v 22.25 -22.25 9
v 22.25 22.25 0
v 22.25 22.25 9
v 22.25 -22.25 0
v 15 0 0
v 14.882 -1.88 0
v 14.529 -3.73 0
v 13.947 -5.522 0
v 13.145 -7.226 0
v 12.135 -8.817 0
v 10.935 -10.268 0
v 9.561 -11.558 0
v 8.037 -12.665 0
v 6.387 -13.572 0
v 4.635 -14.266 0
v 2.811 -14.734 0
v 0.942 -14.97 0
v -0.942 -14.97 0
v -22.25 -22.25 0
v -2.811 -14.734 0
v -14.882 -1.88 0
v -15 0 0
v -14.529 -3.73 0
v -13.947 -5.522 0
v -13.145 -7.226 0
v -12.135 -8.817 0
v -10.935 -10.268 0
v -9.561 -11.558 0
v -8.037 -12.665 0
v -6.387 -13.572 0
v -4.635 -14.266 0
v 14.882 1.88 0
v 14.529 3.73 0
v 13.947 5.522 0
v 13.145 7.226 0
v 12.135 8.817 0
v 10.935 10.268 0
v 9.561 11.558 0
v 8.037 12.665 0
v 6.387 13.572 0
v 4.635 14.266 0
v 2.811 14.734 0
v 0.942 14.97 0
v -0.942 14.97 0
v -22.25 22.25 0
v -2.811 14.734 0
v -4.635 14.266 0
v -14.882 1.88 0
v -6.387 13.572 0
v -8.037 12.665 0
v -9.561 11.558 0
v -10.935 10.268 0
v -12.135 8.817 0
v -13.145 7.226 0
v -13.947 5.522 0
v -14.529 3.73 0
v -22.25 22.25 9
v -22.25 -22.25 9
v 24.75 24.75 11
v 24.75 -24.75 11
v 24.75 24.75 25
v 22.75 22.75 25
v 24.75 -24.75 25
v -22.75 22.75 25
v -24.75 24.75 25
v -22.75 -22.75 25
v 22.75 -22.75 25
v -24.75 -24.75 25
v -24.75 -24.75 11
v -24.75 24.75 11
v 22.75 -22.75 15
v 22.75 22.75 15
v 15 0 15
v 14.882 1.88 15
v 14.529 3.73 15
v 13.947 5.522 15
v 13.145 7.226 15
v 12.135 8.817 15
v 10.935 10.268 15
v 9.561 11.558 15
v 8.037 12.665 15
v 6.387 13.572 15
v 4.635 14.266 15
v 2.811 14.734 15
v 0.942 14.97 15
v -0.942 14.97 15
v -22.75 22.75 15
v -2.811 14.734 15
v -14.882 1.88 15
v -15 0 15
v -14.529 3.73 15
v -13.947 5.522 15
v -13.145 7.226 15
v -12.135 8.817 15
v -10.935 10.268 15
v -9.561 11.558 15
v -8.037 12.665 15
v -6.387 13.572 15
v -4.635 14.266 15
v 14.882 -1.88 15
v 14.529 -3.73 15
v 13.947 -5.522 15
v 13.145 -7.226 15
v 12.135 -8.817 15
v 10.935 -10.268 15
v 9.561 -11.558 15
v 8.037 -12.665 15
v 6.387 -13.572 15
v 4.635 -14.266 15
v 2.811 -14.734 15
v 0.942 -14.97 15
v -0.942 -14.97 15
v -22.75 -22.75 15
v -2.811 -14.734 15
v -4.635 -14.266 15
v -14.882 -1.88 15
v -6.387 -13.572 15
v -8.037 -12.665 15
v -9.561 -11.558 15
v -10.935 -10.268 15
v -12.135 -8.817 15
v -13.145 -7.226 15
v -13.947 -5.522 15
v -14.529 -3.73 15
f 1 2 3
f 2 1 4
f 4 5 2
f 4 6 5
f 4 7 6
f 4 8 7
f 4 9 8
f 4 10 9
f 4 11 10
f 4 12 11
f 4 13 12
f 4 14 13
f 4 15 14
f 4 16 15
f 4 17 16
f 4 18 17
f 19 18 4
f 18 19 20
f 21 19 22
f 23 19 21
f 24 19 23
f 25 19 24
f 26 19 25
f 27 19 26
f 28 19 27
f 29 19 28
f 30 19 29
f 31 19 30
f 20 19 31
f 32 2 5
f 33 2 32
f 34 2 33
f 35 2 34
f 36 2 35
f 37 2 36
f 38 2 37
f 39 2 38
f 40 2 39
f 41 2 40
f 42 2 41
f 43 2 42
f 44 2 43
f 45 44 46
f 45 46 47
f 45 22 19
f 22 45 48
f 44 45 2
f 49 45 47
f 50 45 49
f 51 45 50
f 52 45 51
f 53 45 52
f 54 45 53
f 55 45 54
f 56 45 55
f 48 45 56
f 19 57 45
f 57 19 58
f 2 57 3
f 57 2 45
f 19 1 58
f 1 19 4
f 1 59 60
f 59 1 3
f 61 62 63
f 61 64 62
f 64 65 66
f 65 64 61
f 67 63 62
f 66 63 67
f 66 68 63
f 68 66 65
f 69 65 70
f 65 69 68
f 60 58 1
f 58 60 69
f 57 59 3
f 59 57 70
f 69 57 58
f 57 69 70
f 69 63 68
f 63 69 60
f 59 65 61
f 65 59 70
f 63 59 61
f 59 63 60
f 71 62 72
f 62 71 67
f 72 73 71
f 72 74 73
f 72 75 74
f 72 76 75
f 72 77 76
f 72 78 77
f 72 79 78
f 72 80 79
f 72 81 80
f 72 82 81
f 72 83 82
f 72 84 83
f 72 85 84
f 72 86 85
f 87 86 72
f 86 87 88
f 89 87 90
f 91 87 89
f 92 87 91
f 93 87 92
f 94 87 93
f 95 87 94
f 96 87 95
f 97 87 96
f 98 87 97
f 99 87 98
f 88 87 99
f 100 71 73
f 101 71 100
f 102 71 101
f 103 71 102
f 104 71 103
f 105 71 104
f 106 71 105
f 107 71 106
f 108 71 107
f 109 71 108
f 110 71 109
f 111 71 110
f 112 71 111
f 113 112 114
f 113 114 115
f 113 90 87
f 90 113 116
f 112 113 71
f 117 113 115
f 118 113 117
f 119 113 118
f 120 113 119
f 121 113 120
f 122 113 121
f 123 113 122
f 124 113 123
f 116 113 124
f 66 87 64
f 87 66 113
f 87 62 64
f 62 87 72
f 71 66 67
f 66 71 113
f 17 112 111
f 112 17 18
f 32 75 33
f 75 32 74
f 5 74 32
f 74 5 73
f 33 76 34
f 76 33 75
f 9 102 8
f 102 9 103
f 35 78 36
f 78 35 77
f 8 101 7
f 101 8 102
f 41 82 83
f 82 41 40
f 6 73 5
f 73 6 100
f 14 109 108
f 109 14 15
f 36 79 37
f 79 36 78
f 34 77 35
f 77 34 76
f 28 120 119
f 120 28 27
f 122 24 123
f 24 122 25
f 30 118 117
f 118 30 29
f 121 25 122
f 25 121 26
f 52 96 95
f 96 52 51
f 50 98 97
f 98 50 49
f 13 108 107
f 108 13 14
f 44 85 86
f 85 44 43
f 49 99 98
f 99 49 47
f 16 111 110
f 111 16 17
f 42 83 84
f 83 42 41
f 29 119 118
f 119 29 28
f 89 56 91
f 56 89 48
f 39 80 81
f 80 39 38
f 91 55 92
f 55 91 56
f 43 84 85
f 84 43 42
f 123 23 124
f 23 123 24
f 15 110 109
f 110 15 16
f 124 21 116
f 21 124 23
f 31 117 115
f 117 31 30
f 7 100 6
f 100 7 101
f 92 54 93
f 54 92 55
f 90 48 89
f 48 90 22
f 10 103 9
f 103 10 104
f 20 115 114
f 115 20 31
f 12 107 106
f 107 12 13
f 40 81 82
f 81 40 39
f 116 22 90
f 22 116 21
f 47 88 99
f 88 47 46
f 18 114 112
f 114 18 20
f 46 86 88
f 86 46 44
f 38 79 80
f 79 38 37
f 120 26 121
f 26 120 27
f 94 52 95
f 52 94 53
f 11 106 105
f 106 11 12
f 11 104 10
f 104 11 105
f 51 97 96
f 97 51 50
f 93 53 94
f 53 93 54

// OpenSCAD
//
//  parametric furniture foot extension
//  for leveling furniture on uneven floors
//  but also uneven furniture on even floors
//

extension = 15.0; // amount of extension needed

fsize_x = 44.5; // size of furniture foot
fsize_y = 44.5; // size of furniture foot
holedia = 30.0; // central hole, if desired, can be zero
wall = 2.0; // outer wall (fence) thickness
minwall = 0.0; // minimum outer wall total height (can be zero)
fence = 10.0; // minimum outer wall overlap of original foot 

tol = 0.5; // tolerance

d = 1*0.1;

difference () {
    union () { // add:
        translate([-fsize_x/2, -fsize_y/2, 0]) cube([fsize_x, fsize_y, extension]);
        hull () {
            translate([-fsize_x/2-tol-wall, -fsize_y/2-tol-wall, min(extension-2*wall,extension+fence-minwall)]) cube([fsize_x+2*tol+2*wall, fsize_y+2*tol+2*wall, max(2*wall+fence, minwall)]);
            translate([-fsize_x/2, -fsize_y/2, extension-2*wall-wall]) cube([fsize_x, fsize_y, wall]);
        }    
    }
    union () { //sub:
        // hole for furniture foot:
        translate([-fsize_x/2-tol, -fsize_y/2-tol, extension]) cube([fsize_x+2*tol, fsize_y+2*tol, max(minwall,fence)+d]);
        // any excess "below the surface":
        translate([-fsize_x/2-tol-wall-d, -fsize_y/2-tol-wall-d, -(wall+max(minwall,fence)+d)]) cube([fsize_x+2*tol+2*wall+2*d, fsize_y+2*tol+2*wall+2*d, wall+max(minwall,fence)+d]);
        // central hole:
        translate([0, 0, -(wall+max(minwall,fence)+d)]) cylinder(d=holedia, h=d+wall+max(minwall,fence)+extension+max(minwall,fence)+d, $fn=50);
    }
}
